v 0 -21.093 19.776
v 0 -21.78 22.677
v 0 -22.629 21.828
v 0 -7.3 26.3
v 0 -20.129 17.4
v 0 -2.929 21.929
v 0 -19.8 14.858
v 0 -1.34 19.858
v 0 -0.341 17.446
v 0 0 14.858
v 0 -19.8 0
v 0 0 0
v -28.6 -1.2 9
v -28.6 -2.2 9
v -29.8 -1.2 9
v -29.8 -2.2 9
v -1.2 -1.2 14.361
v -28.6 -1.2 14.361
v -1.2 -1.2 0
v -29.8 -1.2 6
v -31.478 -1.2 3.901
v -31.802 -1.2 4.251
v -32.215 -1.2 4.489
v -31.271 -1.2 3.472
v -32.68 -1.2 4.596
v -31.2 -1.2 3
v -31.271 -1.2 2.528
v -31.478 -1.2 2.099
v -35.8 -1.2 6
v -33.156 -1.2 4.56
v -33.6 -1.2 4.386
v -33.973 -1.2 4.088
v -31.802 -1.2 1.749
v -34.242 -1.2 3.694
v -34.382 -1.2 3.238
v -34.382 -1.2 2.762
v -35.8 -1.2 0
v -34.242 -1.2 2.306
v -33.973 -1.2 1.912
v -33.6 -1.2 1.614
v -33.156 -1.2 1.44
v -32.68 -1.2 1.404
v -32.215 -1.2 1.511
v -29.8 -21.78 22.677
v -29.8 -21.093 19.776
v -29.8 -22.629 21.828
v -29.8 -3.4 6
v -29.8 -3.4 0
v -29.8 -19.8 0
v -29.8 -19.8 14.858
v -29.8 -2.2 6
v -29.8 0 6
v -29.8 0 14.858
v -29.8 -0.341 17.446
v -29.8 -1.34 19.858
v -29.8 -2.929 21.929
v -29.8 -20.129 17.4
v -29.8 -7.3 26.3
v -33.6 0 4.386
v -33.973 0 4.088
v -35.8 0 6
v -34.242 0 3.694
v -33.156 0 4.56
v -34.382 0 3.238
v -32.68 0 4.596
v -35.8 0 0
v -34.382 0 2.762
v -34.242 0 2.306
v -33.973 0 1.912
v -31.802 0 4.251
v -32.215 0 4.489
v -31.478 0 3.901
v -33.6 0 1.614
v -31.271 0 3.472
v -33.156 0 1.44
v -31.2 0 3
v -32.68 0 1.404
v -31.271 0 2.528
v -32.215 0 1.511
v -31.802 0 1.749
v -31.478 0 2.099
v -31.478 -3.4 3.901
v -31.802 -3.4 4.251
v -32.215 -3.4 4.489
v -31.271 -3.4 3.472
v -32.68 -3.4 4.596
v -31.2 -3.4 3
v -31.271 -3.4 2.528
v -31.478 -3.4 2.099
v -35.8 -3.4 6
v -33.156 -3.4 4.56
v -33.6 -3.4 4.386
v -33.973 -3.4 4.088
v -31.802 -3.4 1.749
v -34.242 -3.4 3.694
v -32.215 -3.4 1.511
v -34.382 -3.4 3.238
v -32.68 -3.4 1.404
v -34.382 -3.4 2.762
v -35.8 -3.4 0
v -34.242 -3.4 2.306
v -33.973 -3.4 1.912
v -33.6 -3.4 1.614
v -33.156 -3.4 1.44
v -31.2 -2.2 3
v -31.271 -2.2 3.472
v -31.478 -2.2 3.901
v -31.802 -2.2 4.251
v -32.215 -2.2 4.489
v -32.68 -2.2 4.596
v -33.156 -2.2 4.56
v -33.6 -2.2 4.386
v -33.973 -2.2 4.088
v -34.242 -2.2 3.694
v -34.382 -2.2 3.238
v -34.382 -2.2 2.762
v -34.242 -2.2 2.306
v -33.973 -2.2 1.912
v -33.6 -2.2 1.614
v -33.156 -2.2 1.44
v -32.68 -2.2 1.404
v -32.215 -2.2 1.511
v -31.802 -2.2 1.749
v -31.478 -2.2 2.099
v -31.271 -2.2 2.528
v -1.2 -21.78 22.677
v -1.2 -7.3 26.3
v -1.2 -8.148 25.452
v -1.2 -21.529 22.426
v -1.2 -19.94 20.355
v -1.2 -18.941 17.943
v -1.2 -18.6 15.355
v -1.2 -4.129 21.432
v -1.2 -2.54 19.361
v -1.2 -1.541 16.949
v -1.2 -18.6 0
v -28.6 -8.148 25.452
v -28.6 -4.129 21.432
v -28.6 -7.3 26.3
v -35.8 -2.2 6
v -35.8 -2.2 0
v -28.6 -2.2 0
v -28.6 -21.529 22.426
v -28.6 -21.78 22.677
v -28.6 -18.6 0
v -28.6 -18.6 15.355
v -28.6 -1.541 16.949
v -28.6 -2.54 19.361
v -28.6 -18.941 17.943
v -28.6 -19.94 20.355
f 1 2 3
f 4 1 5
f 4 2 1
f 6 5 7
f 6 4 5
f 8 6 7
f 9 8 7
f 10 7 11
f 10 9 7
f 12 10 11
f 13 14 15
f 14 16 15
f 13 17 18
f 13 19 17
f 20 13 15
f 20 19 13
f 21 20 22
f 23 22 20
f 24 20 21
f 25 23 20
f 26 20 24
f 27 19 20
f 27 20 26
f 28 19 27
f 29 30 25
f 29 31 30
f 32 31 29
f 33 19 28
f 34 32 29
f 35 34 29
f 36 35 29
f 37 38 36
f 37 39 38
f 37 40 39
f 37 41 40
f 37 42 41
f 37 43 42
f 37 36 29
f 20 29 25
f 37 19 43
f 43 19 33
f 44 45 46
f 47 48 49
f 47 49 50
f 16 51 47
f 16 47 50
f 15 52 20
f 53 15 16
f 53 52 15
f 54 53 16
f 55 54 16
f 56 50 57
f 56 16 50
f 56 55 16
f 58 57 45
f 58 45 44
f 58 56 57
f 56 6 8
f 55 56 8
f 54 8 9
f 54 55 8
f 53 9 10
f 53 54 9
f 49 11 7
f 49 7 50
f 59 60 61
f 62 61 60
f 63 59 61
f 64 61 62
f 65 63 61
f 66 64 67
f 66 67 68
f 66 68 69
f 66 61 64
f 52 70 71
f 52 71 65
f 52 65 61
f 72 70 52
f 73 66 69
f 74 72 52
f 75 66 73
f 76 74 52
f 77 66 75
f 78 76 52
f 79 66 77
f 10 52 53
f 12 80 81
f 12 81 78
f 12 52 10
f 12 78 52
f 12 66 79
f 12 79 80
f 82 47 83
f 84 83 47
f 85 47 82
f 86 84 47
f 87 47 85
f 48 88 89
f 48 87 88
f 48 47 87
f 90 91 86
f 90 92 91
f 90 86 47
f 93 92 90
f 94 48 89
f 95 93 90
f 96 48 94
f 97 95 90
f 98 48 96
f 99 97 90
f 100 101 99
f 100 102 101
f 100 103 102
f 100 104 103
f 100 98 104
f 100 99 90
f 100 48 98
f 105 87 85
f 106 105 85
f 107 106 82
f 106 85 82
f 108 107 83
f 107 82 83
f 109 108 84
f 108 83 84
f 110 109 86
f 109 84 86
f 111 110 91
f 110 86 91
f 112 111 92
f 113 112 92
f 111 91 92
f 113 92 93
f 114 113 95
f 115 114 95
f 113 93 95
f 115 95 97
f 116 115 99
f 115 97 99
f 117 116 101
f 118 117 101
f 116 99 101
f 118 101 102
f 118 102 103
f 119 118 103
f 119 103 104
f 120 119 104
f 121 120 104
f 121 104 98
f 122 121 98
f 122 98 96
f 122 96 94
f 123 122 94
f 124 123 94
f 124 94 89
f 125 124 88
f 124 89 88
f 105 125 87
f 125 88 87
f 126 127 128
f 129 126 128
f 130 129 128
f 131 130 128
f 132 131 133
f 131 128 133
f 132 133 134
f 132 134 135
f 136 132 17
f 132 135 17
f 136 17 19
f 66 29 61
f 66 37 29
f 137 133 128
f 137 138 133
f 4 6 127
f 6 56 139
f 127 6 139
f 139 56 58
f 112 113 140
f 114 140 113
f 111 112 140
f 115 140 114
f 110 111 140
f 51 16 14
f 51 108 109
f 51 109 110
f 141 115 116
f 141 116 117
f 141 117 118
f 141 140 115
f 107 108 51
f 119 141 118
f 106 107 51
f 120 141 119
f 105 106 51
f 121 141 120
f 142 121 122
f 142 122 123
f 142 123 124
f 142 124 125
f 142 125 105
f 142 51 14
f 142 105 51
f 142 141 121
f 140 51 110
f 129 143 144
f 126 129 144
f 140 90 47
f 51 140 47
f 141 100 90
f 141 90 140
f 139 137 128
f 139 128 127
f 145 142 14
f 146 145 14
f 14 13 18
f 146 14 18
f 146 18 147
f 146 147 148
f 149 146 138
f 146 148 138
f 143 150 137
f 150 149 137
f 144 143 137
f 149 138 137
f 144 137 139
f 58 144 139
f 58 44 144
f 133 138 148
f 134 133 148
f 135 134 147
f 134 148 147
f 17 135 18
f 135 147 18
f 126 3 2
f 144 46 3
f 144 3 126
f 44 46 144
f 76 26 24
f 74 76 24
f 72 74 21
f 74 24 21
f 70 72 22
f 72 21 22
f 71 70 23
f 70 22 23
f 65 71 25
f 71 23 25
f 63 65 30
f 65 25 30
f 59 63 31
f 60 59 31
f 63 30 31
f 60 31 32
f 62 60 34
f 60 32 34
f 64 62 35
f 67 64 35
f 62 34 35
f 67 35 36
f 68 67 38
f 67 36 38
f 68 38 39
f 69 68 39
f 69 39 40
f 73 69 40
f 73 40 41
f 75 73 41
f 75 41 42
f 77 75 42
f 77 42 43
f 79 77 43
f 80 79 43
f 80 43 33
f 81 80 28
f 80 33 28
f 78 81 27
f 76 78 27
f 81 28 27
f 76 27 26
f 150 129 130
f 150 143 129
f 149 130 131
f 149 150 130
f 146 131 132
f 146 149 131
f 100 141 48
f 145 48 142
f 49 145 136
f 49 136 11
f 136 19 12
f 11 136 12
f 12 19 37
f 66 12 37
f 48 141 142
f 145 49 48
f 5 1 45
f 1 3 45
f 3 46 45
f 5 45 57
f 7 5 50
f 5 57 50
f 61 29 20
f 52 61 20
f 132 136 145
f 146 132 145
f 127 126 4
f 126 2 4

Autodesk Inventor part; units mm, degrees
ref_plane "YZ Plane" through (0, 0, 0) normal (1, 0, 0) x (0, 1, 0)
ref_plane "XZ Plane" through (0, 0, 0) normal (0, 1, 0) x (-1, 0, 0)
ref_plane "XY Plane" through (0, 0, 0) normal (0, 0, 1) x (1, 0, 0)
sketch "Skizze1" plane through (0, 0, 0) normal (0, 0, 1) x (1, 0, 0)
  line L0 (-1.2, -1.2) -> (-1.2, -18.6)
  line L1 (-1.2, -18.6) -> (-28.6, -18.6)
  line L2 (-28.6, -18.6) -> (-28.6, -2.2)
  line L3 (0, 0) -> (0, -19.8)
  line L4 (0, -19.8) -> (-29.8, -19.8)
  line L5 (-29.8, -19.8) -> (-29.8, -3.4)
  line L6 (-29.8, -3.4) -> (-35.8, -3.4)
  line L7 (-35.8, -3.4) -> (-35.8, -2.2)
  line L8 (-35.8, -2.2) -> (-28.6, -2.2)
  line L9 (-1.2, -1.2) -> (-35.8, -1.2)
  line L10 (-35.8, -1.2) -> (-35.8, 0)
  line L11 (-35.8, 0) -> (0, 0)
  line L12 (0, -23.76) -> (0, 3.96) projected
  line L13 (-42.96, 0) -> (7.16, 0) projected
  point P0 (7.16, 0)
  dimension "d6" = 17.4
  dimension "d7" = 27.4
  dimension "d8" = 16.4
  dimension "d9" = 90
  dimension "d10" = 6
  dimension "d11" = 90
  dimension "d12" = 1.2
  dimension "d13" = 1.2
  dimension "d14" = 1.2
  dimension "d15" = 1.2
  dimension "d16" = 0
  dimension "d17" = 0
  dimension "d18" = 1.2
extrude "Extrusion1" add sketch "Skizze1" along normal blind 9
sketch "Skizze2" plane through (-35.8, -3.4, 0) normal (0, -1, 0) x (1, 0, 0)
  circle A0 centre (3, 3) radius 1.6
  line L0 (0, 9) -> (6, 9) projected
  line L1 (0, 0) -> (0, 9) projected
  line L2 (0, 0) -> (6, 0) projected
  line L3 (6, 9) -> (0, 9)
  line L4 (0, 9) -> (0, 6)
  line L5 (0, 6) -> (6, 6)
  line L6 (6, 6) -> (6, 9)
  point P0 (35.8, 0)
  dimension "d21" = 3.2
  dimension "d23" = 3
  dimension "d75" = 3
  dimension "d76" = 6
  dimension "d77" = 3
extrude "Extrusion2" cut sketch "Skizze2" against normal through all
sketch "Skizze15" plane through (-29.8, -19.8, 0) normal (-1, 0, 0) x (0, 0, 1)
  line L0 (9, 17.6) -> (9, 0) projected
  line L1 (9, 0) -> (19, 0)
  line L2 (9, 0) -> (19, 0) construction
  line L3 (19, 0) -> (21.8284, -2.8284)
  line L4 (21.8284, -2.8284) -> (22.677, -1.9799)
  line L5 (9, 1.2) -> (19.4971, 1.2)
  line L6 (19.4971, 1.2) -> (22.677, -1.9799)
  line L7 (6, 19.8) -> (9, 19.8) projected
  line L8 (9, 19.8) -> (9, 18.6) projected
  line L9 (9, 19.8) -> (9, 18.6)
  line L10 (9, 19.8) -> (19, 19.8)
  line L11 (9, 19.8) -> (19, 19.8) construction
  line L12 (19, 19.8) -> (26.3, 12.5)
  line L13 (9, 18.6) -> (6, 18.6) projected
  line L14 (9, 18.6) -> (18.5029, 18.6)
  line L15 (18.5029, 18.6) -> (25.4515, 11.6515)
  line L16 (25.4515, 11.6515) -> (26.3, 12.5)
  line L17 (28.3, -13.6) -> (28.3, -12.6) projected
  point P0 (0, 19.8)
  dimension "d78" = 10
  dimension "d79" = 0
  dimension "d80" = 4
  dimension "d81" = 135
  dimension "d82" = 1.2
  dimension "d83" = 0
  dimension "d84" = 10
  dimension "d85" = 0
  dimension "d86" = 135
  dimension "d87" = 2
  dimension "d88" = 1.2
extrude "Extrusion8" add sketch "Skizze15" against normal up to surface (29.8 mm away)
sketch "Skizze16" plane through (0, -19.8, 0) normal (1, 0, 0) x (0, 0, -1)
  line L0 (-22.677, -1.9799) -> (-19.4971, 1.2) projected
  line L1 (-19.4971, 1.2) -> (-9, 1.2) projected
  line L2 (-9, 1.2) -> (-9, 18.6) projected
  line L3 (-9, 18.6) -> (-18.5029, 18.6) projected
  line L4 (-18.5029, 18.6) -> (-25.4515, 11.6515) projected
  line L5 (-25.4515, 11.6515) -> (-26.3, 12.5) projected
  line L6 (-25.4515, 11.6515) -> (-26.3, 12.5) projected
  line L7 (-22.677, -1.9799) -> (-26.3, 12.5)
  point P0 (0, 19.8)
extrude "Extrusion9" add sketch "Skizze16" against normal up to surface (1.2 mm away)
sketch "Skizze17" plane through (-29.8, -19.8, 0) normal (-1, 0, 0) x (0, 0, 1)
  line L0 (9, 17.6) -> (9, 1.2) projected
  line L1 (9, 1.2) -> (19.4971, 1.2) projected
  line L2 (19.4971, 1.2) -> (22.677, -1.9799) projected
  line L3 (25.4515, 11.6515) -> (26.3, 12.5) projected
  line L4 (18.5029, 18.6) -> (25.4515, 11.6515) projected
  line L5 (18.5029, 18.6) -> (6, 18.6) projected
  line L6 (9, 17.6) -> (9, 18.6)
  line L7 (22.677, -1.9799) -> (26.3, 12.5)
  point P0 (0, 19.8)
extrude "Extrusion10" add sketch "Skizze17" against normal up to surface (1.2 mm away)
fillet "Rundung1" radius 10 4 edges at (-14.9, -19.8, 19) (-14.9, 0, 19) (-14.9, -18.6, 19.4971) (-14.9, -1.2, 18.5029)
properties part number "shroud 01 volcano" material "ABS-Kunststoff"
